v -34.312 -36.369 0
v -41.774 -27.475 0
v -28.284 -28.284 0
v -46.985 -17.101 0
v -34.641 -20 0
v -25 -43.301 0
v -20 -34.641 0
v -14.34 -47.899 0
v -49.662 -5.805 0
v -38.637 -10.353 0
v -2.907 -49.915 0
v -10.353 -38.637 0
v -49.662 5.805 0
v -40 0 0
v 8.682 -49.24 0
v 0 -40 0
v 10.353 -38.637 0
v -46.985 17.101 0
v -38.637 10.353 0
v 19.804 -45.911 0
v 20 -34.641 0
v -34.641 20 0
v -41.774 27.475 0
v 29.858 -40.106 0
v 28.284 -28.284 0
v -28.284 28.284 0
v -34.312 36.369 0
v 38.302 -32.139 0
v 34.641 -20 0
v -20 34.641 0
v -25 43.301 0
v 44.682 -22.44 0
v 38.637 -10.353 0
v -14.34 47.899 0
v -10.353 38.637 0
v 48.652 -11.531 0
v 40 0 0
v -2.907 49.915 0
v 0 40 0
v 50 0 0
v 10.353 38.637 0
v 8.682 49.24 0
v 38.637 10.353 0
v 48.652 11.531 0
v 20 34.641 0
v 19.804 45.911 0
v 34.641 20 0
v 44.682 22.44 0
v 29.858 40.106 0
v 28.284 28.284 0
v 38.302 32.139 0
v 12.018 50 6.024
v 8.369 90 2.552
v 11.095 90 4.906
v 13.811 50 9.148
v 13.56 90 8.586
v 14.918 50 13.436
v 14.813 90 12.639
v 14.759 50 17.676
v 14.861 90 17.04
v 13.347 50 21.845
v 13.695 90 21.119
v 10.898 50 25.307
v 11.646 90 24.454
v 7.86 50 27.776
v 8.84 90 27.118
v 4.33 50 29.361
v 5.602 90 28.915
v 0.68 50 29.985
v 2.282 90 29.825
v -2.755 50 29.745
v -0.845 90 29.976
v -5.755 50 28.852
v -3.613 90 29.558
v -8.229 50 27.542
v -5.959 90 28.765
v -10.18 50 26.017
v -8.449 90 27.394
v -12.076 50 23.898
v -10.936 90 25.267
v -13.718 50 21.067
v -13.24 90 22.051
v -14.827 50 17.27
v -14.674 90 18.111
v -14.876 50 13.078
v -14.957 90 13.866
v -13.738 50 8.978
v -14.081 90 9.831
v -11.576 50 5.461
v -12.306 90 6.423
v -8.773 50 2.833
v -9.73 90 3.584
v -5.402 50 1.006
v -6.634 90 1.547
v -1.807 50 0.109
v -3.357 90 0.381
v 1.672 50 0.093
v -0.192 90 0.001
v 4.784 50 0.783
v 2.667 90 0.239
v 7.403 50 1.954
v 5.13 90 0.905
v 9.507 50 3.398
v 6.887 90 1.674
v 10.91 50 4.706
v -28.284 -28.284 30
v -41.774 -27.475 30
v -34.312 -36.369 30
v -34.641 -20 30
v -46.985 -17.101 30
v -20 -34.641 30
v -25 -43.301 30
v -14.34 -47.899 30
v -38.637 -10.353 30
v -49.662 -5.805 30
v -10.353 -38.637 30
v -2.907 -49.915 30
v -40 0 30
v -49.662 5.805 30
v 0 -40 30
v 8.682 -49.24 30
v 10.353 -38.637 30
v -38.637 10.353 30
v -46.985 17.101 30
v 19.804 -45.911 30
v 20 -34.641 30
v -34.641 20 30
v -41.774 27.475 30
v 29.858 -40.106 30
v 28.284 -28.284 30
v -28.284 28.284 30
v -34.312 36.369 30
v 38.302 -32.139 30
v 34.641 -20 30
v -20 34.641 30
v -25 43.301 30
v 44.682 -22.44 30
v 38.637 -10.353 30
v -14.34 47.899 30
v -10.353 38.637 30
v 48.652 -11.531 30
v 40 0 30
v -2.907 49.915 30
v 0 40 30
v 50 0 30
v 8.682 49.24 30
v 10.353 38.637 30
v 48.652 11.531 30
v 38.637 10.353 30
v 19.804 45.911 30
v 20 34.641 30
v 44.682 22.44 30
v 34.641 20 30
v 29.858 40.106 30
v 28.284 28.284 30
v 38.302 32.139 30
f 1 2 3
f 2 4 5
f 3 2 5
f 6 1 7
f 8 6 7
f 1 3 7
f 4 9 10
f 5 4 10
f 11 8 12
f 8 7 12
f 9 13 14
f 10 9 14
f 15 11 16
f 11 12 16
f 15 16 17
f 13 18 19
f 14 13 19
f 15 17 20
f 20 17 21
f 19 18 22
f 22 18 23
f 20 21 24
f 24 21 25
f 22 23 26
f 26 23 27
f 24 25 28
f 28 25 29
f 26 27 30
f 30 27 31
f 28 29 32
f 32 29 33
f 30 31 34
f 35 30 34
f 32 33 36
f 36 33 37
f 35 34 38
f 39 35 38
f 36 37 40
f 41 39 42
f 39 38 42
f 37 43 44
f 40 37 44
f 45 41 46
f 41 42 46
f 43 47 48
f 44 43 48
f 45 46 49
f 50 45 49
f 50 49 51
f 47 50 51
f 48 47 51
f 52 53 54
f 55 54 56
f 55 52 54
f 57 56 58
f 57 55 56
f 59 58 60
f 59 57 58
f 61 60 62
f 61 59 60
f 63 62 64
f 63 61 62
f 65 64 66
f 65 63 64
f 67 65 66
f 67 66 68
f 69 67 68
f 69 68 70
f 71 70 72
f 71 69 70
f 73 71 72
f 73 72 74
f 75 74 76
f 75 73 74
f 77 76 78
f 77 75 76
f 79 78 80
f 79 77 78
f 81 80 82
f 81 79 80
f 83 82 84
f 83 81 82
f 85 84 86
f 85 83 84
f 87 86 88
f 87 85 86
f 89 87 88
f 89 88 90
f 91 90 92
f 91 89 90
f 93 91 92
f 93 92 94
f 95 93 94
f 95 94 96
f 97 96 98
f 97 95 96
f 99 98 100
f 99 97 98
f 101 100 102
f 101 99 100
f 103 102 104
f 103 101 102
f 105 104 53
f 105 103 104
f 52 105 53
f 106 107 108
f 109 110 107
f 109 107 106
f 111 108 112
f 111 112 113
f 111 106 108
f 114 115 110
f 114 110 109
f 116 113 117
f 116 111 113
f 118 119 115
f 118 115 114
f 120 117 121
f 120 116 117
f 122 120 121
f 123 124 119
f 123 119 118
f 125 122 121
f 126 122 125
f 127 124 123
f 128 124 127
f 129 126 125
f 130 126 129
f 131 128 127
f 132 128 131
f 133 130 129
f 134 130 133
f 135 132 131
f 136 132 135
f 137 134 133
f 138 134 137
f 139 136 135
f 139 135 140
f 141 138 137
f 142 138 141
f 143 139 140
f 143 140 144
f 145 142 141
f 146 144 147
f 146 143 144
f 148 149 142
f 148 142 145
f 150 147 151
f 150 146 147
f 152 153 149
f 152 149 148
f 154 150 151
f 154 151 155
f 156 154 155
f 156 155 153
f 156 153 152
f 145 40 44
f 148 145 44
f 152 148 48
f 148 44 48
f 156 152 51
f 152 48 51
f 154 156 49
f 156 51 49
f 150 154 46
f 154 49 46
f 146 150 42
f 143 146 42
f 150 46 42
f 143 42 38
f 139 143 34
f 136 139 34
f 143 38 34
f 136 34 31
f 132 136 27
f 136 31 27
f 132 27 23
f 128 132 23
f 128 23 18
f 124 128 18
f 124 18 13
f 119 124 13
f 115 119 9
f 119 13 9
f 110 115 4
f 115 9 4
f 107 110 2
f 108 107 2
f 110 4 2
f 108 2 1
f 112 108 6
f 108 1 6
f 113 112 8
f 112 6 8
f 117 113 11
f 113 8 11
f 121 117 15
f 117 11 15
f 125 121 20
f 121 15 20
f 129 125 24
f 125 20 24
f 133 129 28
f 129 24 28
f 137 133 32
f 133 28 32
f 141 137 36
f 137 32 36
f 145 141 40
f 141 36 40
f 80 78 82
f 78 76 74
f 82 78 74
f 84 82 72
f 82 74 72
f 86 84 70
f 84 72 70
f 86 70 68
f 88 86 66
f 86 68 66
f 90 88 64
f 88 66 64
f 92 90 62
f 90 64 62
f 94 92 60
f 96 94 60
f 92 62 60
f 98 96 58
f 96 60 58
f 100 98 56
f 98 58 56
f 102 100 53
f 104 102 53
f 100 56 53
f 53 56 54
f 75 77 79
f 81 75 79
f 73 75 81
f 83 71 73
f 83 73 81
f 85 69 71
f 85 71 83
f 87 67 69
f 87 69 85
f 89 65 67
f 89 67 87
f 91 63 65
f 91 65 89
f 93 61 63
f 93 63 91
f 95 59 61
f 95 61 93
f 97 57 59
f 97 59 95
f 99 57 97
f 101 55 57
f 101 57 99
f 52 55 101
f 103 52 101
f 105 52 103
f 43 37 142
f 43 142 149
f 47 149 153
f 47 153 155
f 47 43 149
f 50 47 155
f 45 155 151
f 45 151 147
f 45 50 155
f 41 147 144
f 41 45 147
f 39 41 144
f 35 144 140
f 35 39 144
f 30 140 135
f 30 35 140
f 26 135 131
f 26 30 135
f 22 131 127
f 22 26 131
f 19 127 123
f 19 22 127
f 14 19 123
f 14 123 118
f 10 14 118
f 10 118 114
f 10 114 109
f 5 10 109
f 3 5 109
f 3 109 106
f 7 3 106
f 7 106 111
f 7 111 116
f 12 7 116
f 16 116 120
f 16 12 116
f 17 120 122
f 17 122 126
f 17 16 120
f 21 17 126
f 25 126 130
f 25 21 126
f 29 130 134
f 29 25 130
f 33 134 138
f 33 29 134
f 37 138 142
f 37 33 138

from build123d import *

# Parameters (mm, degrees)
SKETCH1_R           = 50
SKETCH1_R_2         = 40
BOSS_EXTRUDE1_DEPTH = 30


with BuildPart() as part:
    # Sketch1 → Boss-Extrude1 (new body)
    with BuildSketch(Plane.XY):
        Circle(SKETCH1_R)
        Circle(SKETCH1_R_2, mode=Mode.SUBTRACT)
    extrude(amount=BOSS_EXTRUDE1_DEPTH)


with BuildPart() as body_2:
    # Loft1: read off the stored shape, not the designer's step
    # Loft1: loft between two sections, ruled curve by curve
    loft1_from = [
        Edge.make_bspline([(8.368784012, 90, 2.551568205), (33.265647603, 90, 19.289136228), (16.528079579, 90, 44.185999819), (-8.368784012, 90, 27.448431795), (-33.265647603, 90, 10.710863772), (-16.528079579, 90, -14.185999819), (8.368784012, 90, 2.551568205)], [0, 0, 0, 0, 0.5, 0.5, 0.5, 1, 1, 1, 1], 3, [1, 0.333333333, 0.333333333, 1, 0.333333333, 0.333333333, 1]),
    ]
    loft1_to = [
        Edge.make_bspline([(12.017867278, 50, 6.023872434), (29.97012241, 50, 30.059606991), (5.934387853, 50, 48.011862123), (-12.017867278, 50, 23.976127566), (-29.97012241, 50, -0.059606991), (-5.934387853, 50, -18.011862123), (12.017867278, 50, 6.023872434)], [0, 0, 0, 0, 0.5, 0.5, 0.5, 1, 1, 1, 1], 3, [1, 0.333333333, 0.333333333, 1, 0.333333333, 0.333333333, 1]),
    ]
    loft1 = Solid(Shell([*[Face.make_surface_from_curves(loft1_from[k], loft1_to[k]) for k in range(1)], Face(Wire(loft1_from)), Face(Wire(loft1_to))]))
    add(loft1)


solid = Compound([part.part, body_2.part])
